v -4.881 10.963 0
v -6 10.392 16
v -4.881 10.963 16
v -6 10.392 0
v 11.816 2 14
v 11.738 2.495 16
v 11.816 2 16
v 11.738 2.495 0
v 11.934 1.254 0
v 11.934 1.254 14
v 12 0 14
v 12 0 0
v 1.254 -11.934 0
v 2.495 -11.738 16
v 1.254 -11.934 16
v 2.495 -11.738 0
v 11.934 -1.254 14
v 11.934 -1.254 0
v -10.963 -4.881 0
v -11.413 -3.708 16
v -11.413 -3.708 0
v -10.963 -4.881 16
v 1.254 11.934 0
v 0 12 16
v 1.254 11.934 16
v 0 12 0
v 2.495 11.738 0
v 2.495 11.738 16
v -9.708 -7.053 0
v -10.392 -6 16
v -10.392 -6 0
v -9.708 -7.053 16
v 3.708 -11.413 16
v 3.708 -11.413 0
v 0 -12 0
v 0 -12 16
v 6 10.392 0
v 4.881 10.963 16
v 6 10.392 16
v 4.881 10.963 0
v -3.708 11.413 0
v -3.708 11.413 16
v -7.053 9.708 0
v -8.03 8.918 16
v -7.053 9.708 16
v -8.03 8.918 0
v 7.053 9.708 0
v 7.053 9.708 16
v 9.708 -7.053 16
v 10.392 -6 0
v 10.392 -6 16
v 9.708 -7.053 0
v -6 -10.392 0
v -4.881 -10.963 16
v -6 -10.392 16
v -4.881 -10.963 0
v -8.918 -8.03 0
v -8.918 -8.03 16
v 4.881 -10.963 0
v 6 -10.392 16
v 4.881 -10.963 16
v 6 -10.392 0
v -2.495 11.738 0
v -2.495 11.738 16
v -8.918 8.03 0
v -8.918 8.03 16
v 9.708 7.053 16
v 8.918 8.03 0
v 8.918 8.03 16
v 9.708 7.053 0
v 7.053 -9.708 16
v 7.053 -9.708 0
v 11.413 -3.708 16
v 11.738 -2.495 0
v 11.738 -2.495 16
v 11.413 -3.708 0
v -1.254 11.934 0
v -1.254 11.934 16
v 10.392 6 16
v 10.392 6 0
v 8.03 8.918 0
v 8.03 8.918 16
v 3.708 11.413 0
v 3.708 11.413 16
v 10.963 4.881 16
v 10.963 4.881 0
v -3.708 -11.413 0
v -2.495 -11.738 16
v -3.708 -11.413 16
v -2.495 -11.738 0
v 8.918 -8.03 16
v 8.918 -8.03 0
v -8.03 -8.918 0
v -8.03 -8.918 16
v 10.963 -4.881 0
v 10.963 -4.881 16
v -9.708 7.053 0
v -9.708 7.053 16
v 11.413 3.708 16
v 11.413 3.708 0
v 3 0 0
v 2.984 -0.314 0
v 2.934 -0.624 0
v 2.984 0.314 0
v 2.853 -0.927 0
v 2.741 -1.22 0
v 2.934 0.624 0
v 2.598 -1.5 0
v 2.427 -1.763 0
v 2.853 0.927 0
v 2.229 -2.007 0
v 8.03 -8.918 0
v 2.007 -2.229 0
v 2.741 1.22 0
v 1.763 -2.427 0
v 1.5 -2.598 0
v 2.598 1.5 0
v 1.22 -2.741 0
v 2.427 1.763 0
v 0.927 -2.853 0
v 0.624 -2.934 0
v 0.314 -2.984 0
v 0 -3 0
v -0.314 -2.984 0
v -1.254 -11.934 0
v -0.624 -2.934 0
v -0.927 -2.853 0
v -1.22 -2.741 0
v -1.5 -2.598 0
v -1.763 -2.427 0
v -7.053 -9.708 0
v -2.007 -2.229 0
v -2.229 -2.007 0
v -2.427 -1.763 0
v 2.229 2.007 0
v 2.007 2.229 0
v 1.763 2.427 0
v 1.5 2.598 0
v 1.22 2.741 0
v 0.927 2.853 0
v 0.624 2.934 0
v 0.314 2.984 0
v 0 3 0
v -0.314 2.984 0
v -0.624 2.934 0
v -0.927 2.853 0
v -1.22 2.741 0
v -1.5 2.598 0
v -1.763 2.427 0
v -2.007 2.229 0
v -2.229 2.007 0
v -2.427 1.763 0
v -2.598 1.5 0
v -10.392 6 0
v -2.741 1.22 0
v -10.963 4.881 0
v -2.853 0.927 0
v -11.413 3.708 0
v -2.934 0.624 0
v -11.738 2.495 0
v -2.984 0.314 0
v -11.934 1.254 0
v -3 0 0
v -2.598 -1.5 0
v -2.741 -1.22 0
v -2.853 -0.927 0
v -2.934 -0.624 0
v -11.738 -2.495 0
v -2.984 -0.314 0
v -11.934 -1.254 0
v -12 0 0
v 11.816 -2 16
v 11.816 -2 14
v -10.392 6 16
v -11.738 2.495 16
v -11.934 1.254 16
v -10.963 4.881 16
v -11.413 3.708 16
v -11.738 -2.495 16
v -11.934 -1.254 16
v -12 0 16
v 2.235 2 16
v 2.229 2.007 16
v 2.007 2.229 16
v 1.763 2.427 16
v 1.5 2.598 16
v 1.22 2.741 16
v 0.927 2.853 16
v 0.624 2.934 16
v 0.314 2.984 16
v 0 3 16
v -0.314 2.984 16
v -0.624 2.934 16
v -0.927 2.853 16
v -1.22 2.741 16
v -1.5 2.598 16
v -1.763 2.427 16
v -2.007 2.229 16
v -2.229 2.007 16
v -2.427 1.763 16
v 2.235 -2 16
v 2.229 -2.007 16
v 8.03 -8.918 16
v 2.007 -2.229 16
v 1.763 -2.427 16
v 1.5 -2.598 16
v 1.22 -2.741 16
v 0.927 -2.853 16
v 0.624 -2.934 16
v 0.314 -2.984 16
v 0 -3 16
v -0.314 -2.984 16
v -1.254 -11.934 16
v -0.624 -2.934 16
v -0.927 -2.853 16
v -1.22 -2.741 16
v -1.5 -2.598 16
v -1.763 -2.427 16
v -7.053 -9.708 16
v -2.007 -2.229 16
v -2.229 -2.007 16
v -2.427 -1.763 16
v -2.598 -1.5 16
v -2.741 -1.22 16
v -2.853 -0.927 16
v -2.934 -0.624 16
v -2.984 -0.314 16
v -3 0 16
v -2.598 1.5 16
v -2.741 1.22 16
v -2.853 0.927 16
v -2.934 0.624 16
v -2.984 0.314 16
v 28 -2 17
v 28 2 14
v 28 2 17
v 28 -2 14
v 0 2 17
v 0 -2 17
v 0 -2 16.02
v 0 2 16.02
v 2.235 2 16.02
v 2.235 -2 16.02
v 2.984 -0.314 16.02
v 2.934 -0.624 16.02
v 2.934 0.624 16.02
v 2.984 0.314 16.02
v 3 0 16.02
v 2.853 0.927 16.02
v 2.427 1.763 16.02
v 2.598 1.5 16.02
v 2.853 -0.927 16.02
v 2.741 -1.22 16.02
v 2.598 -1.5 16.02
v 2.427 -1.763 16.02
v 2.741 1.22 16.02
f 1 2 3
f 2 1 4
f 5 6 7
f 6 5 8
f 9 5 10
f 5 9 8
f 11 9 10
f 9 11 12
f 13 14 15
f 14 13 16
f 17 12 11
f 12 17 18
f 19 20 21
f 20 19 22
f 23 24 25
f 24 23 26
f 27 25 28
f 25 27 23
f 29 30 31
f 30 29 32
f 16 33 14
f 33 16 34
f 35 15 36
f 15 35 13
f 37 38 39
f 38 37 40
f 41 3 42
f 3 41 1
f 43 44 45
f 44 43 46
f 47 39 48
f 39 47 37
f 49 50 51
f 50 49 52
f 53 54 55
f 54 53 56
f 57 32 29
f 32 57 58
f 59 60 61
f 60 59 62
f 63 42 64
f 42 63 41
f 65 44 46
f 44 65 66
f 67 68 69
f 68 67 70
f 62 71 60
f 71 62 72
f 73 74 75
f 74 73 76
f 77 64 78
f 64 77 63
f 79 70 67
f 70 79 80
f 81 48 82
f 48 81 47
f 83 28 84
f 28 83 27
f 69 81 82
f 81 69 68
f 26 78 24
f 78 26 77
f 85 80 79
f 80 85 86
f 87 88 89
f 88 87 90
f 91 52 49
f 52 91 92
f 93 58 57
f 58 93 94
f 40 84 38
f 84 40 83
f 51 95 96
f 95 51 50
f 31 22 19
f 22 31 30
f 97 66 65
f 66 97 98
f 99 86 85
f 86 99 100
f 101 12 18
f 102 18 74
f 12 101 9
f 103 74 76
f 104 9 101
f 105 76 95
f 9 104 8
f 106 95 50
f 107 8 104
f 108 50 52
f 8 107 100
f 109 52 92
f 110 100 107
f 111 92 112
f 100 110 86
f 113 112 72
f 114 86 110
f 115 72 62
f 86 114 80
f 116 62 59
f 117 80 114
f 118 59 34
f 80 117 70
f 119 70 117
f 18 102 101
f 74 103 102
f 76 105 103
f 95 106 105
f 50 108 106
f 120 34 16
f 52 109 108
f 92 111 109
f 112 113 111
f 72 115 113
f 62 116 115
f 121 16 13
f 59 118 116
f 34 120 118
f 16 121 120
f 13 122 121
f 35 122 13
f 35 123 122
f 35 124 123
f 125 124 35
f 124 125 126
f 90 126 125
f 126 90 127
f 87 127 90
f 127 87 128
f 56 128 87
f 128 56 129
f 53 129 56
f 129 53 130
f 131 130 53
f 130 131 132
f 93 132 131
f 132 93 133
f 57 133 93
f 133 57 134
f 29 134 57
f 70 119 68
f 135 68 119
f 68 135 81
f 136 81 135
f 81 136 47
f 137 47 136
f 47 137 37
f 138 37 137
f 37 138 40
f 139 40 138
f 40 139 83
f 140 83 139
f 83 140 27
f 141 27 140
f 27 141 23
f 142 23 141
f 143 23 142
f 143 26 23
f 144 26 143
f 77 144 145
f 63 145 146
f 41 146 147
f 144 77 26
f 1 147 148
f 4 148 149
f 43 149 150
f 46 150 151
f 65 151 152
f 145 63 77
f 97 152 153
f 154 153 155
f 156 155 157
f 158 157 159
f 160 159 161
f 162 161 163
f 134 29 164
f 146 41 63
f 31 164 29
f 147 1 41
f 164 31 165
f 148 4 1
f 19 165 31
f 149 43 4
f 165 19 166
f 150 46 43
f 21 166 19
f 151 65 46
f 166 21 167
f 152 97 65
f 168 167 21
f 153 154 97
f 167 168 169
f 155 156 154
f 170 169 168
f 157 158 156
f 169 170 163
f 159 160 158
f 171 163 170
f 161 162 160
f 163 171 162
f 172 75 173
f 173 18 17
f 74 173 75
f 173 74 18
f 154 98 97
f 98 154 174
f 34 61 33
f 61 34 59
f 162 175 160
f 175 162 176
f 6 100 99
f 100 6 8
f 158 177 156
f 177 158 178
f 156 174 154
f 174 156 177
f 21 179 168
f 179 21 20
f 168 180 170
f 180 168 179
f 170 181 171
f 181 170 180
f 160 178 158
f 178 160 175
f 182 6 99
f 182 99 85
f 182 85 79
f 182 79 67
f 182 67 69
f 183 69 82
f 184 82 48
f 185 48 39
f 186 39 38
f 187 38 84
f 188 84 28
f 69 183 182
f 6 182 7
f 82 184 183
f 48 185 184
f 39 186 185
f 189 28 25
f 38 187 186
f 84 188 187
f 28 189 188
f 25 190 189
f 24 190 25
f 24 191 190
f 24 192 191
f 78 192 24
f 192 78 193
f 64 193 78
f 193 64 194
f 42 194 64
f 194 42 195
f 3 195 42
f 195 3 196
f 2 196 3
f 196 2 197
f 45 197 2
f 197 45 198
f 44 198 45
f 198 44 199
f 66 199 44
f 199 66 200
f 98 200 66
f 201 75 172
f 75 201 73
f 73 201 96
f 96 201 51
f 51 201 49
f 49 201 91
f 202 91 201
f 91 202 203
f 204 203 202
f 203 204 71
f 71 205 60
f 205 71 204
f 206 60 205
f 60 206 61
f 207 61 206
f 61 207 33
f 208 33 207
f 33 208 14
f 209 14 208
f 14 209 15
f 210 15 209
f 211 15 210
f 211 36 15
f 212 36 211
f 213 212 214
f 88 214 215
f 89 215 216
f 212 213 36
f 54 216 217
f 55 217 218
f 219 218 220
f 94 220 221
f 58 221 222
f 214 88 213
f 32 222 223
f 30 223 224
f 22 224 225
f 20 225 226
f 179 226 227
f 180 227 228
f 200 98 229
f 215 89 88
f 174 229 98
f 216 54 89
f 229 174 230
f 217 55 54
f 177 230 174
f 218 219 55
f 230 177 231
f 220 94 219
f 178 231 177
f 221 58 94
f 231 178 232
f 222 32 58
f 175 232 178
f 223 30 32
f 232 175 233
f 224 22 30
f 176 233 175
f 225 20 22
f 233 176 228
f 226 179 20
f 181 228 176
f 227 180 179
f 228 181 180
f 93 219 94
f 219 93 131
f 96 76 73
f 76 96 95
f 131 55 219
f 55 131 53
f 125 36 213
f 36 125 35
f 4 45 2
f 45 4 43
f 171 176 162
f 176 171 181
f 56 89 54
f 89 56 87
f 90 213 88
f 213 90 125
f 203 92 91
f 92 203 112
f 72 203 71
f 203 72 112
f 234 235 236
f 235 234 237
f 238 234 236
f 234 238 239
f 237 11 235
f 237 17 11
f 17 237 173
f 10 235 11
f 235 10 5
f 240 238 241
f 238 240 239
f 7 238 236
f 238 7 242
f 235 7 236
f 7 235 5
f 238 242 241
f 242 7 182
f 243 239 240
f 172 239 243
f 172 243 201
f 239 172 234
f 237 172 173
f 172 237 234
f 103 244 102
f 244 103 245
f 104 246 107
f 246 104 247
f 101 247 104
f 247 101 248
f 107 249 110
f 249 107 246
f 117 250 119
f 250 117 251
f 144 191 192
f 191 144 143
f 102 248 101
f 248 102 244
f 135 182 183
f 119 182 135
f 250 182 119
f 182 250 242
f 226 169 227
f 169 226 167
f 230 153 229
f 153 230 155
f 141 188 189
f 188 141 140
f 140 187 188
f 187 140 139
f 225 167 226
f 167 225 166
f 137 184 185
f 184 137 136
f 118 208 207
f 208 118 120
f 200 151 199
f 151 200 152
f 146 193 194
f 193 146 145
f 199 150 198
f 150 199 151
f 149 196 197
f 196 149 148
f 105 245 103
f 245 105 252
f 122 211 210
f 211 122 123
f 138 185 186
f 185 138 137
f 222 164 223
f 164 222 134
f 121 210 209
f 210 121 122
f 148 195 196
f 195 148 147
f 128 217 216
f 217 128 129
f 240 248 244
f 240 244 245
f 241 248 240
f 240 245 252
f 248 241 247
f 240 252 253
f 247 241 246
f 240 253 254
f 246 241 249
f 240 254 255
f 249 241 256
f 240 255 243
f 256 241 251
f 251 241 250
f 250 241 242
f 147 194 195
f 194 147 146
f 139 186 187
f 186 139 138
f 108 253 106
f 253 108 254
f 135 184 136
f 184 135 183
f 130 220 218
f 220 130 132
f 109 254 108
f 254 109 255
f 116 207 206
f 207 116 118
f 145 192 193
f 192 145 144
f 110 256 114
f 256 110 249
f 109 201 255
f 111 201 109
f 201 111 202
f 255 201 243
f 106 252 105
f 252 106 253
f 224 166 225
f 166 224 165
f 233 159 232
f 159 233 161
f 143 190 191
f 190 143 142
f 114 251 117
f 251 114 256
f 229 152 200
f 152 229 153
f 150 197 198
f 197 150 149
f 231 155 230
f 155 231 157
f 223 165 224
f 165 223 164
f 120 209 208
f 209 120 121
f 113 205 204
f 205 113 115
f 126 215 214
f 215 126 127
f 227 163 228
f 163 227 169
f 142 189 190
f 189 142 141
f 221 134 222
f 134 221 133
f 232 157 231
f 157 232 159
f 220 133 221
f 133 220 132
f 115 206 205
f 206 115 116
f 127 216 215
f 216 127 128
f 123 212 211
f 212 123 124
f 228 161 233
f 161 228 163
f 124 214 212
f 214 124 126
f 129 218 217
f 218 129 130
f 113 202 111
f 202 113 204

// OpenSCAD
// Quarter-turn cam lock.
$fn = 60;
eps = 0.02;
body_d = 24;
body_l = 16;
arm_l = 28;
difference() { union() { cylinder(d=body_d,h=body_l); translate([0,-2,body_l-2]) cube([arm_l,4,3]); } translate([0,0,-eps]) cylinder(d=6,h=body_l+2*eps); }
